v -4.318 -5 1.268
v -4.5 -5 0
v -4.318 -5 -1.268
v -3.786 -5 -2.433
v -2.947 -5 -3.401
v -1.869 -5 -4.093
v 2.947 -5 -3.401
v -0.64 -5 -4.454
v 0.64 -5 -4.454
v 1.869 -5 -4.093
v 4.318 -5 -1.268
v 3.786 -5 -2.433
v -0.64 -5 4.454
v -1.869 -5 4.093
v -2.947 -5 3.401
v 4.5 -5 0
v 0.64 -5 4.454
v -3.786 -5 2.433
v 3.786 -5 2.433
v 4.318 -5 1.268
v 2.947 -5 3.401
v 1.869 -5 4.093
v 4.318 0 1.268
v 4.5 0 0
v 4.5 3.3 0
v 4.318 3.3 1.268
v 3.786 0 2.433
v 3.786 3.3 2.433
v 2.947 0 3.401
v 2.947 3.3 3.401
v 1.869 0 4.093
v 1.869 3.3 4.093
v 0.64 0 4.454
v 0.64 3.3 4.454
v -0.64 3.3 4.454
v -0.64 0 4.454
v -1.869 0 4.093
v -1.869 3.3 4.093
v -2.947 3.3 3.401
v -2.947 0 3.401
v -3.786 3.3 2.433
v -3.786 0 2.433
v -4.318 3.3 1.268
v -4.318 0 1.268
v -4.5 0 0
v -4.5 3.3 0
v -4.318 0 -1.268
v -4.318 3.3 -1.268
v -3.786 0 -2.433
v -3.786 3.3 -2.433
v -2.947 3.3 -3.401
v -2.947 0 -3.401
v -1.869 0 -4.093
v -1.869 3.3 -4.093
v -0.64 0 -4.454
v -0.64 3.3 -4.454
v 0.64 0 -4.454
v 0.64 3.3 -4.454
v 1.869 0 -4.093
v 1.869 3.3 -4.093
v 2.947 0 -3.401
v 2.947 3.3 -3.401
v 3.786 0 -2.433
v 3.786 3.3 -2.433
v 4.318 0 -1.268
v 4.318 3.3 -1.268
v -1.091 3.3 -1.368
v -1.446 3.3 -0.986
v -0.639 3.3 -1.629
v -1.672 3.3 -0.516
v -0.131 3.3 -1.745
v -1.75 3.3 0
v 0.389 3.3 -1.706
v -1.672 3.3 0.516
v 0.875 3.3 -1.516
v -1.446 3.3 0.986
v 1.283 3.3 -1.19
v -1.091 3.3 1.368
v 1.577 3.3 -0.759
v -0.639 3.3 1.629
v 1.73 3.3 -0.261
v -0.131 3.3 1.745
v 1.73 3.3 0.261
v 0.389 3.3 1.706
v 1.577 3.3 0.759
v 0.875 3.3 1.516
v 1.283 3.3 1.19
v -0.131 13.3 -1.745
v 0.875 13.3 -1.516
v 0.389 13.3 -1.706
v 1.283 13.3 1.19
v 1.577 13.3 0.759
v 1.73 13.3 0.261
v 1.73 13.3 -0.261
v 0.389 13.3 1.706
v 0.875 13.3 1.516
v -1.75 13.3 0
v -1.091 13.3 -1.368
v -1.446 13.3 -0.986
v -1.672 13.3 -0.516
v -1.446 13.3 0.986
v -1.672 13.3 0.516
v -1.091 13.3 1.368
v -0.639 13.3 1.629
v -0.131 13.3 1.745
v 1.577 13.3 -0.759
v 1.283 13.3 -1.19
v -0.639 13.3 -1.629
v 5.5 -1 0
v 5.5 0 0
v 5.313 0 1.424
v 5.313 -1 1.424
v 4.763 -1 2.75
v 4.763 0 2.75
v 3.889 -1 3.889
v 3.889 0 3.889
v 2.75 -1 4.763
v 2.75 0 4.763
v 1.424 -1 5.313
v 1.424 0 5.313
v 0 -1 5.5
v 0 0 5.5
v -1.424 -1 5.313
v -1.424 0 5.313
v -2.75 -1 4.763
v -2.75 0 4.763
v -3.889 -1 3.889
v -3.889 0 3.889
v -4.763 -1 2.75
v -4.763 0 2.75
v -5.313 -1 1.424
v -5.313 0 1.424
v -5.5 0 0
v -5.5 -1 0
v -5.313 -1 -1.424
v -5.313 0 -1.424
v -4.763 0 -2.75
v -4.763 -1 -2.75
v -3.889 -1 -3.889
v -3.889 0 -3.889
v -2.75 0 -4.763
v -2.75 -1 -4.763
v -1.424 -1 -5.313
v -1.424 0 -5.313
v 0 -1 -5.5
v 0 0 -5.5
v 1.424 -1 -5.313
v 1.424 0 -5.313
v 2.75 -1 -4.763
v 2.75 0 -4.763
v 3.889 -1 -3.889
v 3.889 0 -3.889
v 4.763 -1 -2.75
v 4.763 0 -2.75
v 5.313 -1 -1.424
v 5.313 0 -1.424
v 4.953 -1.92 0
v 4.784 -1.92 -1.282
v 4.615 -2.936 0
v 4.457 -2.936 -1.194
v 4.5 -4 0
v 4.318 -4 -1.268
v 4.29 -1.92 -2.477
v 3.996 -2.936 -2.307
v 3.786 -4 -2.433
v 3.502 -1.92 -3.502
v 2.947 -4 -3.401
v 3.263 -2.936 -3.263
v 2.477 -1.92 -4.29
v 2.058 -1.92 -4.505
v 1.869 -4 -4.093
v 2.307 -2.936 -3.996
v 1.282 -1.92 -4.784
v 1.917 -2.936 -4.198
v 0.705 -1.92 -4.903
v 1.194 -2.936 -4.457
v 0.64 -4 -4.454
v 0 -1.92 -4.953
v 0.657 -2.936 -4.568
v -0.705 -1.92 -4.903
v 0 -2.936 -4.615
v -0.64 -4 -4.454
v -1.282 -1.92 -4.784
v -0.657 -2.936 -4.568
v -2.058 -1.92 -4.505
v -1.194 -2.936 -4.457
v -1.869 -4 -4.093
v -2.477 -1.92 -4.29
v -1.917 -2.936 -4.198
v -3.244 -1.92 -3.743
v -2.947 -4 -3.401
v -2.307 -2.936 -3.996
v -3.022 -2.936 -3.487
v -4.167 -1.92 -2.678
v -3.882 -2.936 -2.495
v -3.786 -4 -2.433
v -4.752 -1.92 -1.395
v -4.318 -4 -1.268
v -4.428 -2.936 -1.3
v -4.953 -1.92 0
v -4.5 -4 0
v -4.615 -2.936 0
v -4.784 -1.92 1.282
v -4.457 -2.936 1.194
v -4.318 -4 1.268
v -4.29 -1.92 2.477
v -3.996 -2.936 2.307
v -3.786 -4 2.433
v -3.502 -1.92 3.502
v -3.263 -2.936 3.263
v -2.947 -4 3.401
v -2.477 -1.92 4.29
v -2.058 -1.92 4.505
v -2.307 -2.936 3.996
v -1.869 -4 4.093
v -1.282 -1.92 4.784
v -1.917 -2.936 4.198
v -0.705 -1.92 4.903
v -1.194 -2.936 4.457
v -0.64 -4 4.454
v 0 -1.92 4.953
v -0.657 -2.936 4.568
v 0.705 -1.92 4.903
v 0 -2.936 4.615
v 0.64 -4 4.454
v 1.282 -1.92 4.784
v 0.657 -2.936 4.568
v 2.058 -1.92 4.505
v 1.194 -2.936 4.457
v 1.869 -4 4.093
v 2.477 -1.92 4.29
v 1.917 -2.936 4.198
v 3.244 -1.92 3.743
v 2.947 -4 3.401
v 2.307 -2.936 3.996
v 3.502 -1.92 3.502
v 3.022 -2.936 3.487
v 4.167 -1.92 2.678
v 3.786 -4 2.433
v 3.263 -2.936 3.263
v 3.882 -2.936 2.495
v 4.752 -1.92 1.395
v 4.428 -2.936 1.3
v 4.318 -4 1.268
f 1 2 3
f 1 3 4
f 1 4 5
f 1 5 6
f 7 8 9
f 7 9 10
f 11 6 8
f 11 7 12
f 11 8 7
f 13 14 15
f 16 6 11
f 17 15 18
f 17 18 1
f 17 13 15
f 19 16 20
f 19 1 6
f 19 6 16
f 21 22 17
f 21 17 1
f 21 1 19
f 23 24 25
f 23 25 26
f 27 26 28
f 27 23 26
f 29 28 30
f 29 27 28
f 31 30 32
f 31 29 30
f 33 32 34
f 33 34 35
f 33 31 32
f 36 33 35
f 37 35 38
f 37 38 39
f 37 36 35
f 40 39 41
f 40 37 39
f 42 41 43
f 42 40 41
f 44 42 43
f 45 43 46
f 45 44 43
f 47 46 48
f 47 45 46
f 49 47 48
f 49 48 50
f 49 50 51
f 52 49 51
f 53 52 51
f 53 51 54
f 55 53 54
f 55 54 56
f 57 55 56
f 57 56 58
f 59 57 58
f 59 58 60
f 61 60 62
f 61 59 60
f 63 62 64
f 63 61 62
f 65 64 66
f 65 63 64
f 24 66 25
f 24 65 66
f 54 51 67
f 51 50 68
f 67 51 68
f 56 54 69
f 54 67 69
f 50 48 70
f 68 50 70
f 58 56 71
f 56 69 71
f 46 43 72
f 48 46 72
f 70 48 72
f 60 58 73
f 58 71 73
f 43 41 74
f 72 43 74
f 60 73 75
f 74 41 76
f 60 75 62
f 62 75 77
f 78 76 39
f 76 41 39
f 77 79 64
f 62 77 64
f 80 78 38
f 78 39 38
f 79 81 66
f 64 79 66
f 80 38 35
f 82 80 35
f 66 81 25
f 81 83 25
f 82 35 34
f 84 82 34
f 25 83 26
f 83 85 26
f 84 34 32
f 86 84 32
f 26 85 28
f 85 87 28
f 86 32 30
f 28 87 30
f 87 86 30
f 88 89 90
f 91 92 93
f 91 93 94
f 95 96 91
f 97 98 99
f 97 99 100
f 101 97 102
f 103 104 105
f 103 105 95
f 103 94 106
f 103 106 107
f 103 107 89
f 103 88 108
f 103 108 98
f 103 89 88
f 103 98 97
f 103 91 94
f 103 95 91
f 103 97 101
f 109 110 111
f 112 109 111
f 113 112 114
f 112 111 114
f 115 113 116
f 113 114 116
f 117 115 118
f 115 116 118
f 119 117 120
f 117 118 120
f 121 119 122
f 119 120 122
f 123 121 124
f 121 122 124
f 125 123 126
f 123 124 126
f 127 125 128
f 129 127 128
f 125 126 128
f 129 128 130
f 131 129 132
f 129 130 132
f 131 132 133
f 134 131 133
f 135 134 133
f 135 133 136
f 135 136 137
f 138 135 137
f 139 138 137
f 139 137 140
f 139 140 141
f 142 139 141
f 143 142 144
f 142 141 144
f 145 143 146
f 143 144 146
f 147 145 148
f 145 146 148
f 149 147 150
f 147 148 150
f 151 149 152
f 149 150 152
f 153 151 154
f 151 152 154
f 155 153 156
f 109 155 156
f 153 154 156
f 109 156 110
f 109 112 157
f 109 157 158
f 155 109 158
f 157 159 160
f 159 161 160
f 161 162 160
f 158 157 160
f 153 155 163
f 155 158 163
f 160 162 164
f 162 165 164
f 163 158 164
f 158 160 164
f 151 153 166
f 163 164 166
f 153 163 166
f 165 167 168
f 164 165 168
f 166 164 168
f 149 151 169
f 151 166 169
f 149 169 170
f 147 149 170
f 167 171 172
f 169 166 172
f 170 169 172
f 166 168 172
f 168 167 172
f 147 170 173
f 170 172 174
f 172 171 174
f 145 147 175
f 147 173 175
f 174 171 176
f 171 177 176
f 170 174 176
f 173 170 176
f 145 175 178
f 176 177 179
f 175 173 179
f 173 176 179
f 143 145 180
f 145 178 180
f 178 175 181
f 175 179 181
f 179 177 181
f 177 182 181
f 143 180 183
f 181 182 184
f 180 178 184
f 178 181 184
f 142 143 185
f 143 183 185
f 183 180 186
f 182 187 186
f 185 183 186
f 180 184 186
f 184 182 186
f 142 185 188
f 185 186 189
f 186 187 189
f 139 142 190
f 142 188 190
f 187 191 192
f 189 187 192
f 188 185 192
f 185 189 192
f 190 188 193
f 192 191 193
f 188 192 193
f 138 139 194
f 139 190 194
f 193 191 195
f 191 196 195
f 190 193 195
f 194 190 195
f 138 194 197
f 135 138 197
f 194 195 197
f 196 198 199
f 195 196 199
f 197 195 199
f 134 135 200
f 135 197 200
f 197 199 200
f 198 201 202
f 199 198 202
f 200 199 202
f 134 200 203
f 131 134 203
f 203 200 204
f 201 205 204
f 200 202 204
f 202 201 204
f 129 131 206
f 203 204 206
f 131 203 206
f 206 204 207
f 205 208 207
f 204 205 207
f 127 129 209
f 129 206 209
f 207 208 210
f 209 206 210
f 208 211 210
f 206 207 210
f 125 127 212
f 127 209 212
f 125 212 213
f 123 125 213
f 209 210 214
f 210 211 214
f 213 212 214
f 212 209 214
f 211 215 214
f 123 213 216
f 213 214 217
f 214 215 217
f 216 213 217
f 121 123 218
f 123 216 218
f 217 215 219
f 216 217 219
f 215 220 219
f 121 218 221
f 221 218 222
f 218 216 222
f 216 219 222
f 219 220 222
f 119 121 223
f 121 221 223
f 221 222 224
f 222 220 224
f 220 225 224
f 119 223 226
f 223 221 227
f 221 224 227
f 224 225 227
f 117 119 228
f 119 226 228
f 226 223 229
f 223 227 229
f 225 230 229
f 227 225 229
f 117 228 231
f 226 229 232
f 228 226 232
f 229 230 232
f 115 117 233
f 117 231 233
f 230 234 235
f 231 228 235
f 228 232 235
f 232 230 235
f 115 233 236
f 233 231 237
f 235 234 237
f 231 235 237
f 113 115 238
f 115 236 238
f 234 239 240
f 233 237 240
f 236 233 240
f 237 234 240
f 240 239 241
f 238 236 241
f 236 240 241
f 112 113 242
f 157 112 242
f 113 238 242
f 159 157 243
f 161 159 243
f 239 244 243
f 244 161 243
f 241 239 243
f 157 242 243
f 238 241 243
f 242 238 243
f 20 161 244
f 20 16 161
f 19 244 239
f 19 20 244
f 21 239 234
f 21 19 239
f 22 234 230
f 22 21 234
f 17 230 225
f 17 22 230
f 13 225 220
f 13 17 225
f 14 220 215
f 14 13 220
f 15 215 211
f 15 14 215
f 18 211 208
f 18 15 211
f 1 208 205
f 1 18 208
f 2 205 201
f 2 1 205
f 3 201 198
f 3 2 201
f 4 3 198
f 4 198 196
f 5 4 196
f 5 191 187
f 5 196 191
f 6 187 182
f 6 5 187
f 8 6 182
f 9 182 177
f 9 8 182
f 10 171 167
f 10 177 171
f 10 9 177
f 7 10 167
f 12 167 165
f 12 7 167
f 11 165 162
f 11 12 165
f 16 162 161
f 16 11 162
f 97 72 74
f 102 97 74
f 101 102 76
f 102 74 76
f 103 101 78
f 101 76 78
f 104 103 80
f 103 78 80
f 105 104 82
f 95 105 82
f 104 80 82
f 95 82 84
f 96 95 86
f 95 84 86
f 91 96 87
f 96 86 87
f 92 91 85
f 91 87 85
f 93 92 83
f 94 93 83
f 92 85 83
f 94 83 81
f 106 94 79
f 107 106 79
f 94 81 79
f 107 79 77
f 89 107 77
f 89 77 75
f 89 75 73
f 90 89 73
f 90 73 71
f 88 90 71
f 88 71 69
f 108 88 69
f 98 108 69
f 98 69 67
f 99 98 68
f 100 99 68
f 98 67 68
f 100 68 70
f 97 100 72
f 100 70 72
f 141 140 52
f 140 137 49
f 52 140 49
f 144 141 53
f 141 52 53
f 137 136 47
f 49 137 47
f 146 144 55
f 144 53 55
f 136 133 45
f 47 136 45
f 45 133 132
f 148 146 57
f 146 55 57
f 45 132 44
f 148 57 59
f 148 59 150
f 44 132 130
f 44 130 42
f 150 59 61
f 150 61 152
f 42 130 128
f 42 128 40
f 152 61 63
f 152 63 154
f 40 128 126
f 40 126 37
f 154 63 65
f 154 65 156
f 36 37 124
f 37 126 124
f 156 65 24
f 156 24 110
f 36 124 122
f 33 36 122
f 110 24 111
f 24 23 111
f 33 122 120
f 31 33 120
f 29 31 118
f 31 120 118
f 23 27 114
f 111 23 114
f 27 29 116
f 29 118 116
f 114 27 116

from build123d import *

# Parameters (mm, degrees)
F0_R     = 4.5
F1_DEPTH = 5
F2_DEPTH = 3.3
F3_R     = 5.5
F4_DEPTH = 1
F6_R     = 1.75
F7_DEPTH = 10


# Not quite as in the source:
# - a fillet or chamfer that OpenCascade refuses, or shapes differently, is made with other operations: its cross-section is extruded or revolved along the edge and cut away or added


with BuildPart() as f1:
    # F0 (on Front) → F1 (new body)
    with BuildSketch(Plane.XZ):
        Circle(F0_R)
    extrude(amount=F1_DEPTH)

    # F2 (add): a face of the model
    f2_faces = [f1.faces().sort_by_distance(p)[0] for p in [
        (0, 0, 0),
    ]]
    extrude(f2_faces, amount=F2_DEPTH)

    # F3 (on Front) → F4 (join)
    with BuildSketch(Plane.XZ):
        Circle(F3_R)
    extrude(amount=F4_DEPTH)

    # F5: fillet of radius 5 on 1 edges, made by hand

    # F5_s1 → F5_t2 (revolve)
    with BuildSketch(Plane.XY):
        with BuildLine():
            ThreePointArc((5.5, -1), (4.7565835097, -2.4188611699), (4.5, -4))
            Line((4.5, -4), (4.5, -1))
            Line((4.5, -1), (5.5, -1))
        make_face()
    revolve(axis=Axis((0, -1, 0), (0, 1, 0)))

    # F6 (on face) → F7 (join)
    with BuildSketch(Plane(origin=(0, 3.3, 0), x_dir=(-1, 0, 0), z_dir=(0, 1, 0))):
        Circle(F6_R)
    extrude(amount=F7_DEPTH)


solid = f1.part
